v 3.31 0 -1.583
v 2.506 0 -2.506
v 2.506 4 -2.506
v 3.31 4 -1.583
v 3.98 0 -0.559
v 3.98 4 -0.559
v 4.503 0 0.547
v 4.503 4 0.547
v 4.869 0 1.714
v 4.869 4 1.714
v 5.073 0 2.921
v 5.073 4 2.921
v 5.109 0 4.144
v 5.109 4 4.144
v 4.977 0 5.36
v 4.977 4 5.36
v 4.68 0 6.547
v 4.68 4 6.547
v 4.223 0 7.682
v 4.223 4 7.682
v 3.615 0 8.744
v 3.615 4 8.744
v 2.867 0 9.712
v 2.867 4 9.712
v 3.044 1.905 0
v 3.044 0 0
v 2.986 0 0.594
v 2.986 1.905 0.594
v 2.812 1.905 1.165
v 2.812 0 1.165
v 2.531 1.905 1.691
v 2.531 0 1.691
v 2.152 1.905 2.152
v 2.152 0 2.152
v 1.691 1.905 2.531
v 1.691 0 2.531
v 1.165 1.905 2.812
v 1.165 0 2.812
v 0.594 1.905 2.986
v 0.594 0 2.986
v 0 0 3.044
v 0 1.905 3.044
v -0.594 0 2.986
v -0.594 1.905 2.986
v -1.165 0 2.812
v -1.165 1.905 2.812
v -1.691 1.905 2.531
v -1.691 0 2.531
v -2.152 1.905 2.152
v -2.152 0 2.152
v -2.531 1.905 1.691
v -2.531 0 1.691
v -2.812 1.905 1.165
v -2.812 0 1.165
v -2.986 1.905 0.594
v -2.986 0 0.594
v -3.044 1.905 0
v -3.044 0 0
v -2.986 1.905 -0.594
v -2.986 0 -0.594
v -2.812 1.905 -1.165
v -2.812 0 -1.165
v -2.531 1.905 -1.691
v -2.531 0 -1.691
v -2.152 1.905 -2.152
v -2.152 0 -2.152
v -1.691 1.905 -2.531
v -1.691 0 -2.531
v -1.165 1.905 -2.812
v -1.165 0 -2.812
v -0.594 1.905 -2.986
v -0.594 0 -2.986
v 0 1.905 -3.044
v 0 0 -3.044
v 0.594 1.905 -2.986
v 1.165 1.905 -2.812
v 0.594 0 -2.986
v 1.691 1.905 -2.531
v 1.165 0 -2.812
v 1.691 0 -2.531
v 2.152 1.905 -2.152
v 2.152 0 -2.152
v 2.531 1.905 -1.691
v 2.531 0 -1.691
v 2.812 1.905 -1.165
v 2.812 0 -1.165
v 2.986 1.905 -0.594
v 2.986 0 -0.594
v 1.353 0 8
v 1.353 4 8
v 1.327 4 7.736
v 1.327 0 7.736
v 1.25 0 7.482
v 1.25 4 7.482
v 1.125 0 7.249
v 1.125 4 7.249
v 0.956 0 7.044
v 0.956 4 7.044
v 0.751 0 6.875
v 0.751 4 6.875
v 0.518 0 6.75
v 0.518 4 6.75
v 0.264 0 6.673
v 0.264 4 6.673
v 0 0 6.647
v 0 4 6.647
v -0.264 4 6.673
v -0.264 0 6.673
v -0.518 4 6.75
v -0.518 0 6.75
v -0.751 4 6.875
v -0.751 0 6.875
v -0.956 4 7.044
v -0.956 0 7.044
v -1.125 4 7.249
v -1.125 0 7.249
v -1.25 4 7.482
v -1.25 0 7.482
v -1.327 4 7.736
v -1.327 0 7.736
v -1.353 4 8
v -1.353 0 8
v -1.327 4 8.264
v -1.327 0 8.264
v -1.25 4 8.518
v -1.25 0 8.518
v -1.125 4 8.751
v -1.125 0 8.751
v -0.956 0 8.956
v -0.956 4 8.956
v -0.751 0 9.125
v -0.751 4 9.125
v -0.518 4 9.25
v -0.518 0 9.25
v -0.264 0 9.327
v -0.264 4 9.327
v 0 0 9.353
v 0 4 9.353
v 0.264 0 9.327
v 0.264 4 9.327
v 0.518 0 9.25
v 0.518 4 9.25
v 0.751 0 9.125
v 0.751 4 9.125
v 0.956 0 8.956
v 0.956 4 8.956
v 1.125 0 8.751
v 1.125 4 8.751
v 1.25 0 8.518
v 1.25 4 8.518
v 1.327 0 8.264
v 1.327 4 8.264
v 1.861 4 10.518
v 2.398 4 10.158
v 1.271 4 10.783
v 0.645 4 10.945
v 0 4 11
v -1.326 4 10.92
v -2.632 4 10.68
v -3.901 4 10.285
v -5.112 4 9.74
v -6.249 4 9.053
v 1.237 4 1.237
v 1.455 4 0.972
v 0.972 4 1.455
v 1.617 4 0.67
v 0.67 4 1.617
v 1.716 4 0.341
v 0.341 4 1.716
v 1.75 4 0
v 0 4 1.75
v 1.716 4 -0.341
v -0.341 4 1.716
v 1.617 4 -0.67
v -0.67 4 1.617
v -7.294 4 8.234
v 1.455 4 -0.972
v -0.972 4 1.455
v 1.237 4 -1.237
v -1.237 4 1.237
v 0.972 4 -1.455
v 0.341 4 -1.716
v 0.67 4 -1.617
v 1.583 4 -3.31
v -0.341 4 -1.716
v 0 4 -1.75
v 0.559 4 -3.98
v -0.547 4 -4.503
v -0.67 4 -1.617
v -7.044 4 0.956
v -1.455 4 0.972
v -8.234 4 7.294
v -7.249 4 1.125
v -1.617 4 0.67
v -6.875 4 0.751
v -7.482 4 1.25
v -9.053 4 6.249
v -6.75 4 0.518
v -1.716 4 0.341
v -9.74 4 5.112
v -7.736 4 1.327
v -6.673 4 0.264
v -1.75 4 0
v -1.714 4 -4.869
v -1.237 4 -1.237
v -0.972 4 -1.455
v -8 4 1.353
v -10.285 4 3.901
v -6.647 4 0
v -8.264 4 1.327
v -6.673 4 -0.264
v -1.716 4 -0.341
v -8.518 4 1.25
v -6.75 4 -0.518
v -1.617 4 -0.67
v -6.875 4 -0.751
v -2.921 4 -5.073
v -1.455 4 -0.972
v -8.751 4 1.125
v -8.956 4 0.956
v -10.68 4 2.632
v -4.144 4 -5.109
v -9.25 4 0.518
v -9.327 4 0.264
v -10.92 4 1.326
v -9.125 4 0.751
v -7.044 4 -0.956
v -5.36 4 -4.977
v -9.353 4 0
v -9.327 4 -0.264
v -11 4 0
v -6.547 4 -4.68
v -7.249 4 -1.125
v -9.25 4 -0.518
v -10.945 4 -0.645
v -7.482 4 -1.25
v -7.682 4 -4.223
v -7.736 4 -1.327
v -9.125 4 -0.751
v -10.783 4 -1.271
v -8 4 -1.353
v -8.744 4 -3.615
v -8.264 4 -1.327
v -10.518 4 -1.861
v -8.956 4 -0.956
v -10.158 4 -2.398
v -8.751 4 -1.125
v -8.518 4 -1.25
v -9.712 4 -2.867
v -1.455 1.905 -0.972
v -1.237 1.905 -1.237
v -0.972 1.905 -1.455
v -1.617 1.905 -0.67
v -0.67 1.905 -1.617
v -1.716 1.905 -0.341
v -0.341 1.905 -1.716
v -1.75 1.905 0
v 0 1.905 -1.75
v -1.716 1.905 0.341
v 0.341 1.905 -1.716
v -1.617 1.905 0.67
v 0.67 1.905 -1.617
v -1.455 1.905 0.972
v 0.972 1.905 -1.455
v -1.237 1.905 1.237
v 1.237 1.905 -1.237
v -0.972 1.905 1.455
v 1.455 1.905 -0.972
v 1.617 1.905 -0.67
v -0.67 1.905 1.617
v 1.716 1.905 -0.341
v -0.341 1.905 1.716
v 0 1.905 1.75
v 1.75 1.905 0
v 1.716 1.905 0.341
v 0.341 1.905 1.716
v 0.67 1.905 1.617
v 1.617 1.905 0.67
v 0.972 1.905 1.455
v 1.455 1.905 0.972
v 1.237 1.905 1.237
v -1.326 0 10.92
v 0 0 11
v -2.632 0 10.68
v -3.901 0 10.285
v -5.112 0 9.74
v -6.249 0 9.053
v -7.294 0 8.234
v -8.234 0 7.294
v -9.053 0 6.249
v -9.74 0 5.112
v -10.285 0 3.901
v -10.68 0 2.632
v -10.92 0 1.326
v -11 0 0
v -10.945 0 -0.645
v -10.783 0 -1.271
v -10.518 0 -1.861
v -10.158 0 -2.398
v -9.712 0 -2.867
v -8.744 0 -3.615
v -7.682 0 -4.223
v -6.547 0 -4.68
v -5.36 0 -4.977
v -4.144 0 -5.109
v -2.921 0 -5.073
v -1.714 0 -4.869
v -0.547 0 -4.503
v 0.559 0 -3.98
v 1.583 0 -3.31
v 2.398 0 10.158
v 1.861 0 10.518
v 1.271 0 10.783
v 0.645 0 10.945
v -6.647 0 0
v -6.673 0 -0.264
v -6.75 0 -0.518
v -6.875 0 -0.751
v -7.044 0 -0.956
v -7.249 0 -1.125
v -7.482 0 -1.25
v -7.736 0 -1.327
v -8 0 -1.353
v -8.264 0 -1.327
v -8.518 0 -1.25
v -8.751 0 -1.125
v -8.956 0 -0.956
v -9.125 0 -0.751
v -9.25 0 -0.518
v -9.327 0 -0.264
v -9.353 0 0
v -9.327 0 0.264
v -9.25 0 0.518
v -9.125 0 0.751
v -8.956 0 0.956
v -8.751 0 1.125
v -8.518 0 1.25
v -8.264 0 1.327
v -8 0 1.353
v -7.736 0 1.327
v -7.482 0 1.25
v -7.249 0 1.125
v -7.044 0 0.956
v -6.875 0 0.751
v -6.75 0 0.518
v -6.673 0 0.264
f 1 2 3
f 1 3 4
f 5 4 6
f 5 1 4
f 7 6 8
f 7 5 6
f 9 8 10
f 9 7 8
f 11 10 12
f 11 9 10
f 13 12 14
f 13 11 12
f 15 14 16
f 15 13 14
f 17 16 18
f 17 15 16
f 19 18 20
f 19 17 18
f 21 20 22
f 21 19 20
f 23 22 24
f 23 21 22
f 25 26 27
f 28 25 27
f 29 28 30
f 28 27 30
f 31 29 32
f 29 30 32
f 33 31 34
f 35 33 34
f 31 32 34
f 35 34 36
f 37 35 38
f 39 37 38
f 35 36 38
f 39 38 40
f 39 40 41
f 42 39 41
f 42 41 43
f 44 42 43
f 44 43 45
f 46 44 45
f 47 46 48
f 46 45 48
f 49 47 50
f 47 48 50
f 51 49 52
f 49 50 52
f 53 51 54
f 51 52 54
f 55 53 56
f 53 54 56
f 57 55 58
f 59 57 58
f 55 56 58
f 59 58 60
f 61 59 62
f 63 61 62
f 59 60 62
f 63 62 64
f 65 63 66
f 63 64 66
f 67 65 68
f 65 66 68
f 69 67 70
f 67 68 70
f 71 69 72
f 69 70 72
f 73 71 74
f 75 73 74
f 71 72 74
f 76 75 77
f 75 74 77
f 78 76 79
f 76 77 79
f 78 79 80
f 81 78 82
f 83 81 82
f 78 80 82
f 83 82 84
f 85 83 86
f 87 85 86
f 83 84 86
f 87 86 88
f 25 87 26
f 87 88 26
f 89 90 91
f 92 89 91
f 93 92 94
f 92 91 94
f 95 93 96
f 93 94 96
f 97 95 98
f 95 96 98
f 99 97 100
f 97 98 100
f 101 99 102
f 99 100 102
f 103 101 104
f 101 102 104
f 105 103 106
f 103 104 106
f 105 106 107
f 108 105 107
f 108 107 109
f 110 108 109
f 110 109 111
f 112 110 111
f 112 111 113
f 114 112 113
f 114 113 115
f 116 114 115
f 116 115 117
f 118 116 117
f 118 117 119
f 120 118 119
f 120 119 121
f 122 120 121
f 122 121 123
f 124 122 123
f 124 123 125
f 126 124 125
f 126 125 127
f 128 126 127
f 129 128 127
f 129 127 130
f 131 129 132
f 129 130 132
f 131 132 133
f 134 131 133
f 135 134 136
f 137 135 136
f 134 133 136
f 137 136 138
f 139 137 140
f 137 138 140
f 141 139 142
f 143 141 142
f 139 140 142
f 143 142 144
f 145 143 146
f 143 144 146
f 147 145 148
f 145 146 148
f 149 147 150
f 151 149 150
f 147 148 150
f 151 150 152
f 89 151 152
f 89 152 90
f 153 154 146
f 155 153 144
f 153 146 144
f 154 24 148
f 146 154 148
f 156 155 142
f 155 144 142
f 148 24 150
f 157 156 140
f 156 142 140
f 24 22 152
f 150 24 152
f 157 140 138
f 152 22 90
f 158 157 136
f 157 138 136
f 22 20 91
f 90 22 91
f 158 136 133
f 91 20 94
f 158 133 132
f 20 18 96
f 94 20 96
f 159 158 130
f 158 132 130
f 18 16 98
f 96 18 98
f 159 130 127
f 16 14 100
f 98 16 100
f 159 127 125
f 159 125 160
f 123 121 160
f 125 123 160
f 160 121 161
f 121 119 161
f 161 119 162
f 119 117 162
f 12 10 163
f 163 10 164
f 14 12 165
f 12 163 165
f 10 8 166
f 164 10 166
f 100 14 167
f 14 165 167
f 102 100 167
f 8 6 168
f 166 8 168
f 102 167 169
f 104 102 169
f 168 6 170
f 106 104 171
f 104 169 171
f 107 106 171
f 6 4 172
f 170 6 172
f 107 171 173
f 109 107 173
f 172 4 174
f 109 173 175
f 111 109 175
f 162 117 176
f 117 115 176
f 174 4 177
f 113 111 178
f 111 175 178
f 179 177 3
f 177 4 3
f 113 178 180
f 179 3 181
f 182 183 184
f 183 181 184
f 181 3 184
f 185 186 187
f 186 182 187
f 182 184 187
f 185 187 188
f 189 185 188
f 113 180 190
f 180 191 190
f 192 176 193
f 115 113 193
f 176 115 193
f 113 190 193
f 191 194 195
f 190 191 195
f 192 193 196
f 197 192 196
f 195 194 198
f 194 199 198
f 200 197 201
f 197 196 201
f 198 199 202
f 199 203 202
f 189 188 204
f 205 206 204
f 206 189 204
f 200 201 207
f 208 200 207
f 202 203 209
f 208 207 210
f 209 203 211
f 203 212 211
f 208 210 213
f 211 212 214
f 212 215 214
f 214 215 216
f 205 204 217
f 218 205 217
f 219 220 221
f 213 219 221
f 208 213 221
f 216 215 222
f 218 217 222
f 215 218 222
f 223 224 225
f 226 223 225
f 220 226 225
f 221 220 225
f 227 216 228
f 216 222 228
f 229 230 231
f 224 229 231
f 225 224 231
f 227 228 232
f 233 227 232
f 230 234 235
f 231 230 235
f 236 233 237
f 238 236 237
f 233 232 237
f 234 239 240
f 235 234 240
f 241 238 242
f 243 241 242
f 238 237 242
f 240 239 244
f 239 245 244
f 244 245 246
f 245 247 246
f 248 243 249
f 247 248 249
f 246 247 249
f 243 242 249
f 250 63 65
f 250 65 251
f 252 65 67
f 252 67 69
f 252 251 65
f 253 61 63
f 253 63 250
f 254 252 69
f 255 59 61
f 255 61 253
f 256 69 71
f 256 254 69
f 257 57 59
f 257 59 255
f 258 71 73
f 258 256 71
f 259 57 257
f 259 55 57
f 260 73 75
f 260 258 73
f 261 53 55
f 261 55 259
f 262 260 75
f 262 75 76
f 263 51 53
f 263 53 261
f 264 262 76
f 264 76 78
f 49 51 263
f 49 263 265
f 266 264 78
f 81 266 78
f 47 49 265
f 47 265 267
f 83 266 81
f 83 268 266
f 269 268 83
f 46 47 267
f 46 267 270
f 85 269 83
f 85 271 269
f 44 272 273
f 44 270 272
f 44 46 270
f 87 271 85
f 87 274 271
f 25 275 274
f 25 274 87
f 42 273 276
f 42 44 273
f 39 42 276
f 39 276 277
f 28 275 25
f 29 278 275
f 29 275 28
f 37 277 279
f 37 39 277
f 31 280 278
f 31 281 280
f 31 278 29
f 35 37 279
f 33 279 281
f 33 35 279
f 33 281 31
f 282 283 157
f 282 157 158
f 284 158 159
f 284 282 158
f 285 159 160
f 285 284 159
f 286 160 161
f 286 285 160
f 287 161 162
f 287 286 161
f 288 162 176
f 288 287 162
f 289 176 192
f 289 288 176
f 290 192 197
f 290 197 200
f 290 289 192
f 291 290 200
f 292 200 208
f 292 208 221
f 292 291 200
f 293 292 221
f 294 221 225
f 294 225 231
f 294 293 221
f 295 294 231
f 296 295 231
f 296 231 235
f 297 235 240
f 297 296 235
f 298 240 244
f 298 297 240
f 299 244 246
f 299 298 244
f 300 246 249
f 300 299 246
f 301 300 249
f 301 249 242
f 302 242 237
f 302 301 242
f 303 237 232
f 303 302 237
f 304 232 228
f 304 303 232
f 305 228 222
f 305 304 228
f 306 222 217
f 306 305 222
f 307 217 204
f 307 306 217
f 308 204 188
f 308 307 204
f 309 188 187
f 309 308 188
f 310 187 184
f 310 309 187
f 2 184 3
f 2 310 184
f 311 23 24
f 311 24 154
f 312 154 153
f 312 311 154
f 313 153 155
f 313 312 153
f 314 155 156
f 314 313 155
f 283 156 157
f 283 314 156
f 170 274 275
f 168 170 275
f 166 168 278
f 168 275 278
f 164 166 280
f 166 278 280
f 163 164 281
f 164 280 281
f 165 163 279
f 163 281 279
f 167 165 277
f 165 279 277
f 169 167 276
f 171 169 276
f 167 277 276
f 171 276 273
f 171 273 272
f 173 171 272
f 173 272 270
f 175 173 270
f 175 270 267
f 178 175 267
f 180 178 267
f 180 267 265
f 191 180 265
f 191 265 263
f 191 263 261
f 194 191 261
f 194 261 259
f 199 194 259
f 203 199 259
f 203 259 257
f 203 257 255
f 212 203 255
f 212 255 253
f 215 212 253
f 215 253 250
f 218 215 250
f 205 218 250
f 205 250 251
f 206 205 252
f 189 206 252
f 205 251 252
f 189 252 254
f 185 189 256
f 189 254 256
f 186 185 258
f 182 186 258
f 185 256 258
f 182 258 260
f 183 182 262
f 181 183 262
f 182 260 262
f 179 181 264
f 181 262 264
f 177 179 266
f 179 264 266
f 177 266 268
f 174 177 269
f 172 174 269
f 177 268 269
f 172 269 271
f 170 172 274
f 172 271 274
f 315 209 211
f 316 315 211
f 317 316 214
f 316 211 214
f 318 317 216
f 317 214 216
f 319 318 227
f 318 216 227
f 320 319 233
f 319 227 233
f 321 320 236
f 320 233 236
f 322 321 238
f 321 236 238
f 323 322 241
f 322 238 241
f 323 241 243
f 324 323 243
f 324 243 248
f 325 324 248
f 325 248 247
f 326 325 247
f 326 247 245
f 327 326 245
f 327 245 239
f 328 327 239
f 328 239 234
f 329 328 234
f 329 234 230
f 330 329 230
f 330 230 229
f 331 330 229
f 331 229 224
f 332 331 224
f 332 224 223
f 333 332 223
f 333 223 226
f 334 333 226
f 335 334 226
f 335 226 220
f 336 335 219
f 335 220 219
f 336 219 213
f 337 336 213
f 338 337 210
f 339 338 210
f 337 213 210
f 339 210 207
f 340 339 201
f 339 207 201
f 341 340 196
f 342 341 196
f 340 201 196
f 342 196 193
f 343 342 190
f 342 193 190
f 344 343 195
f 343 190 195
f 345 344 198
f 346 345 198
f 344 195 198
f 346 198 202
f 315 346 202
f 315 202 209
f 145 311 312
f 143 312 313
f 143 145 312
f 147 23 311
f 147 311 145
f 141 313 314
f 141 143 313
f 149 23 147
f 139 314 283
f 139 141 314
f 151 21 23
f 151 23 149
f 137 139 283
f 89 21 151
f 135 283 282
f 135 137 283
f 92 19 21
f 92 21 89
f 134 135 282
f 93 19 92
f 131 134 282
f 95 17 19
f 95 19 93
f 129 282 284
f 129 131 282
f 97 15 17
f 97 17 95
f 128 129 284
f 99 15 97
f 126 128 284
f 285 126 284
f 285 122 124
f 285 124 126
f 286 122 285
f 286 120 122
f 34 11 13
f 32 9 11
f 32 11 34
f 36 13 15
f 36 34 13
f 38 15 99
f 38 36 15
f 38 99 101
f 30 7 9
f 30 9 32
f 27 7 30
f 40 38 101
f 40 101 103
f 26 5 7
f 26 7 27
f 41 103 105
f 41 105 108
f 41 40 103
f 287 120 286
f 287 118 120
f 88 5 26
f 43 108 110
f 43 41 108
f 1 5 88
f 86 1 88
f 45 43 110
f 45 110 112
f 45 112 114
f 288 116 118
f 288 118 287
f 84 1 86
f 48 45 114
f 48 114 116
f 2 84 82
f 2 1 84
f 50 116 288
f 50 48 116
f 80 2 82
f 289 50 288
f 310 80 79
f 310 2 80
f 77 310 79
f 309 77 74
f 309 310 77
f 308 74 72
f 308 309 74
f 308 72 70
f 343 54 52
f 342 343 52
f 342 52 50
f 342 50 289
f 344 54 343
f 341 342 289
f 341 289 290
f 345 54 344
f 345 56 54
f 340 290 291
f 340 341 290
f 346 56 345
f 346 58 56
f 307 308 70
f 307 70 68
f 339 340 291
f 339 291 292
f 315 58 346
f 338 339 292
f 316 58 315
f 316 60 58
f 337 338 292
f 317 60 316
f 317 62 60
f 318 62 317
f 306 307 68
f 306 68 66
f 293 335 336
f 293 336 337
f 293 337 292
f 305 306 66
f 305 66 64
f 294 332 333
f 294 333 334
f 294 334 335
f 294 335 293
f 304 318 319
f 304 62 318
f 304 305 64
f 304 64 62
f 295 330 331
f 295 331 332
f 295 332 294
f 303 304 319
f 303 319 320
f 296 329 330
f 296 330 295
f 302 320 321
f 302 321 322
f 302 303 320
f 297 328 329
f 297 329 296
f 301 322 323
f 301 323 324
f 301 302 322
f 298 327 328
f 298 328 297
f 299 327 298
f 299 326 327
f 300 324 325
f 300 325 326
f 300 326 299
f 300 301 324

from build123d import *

# Parameters (mm, degrees)
BOSS_EXTRUDE1_DEPTH   = 4
F_6_32_TAPPED_HOLE1_D = 2.7051
SKETCH4_R             = 3.044
CUT_EXTRUDE1_DEPTH    = 1.905
SKETCH5_R             = 1.75
CUT_EXTRUDE2_DEPTH    = 3.095


with BuildPart() as part:
    # Sketch1 → Boss-Extrude1 (new body)
    with BuildSketch(Plane(origin=(0, 0, 0), x_dir=(1, 0, 0), z_dir=(0, 1, 0))):
        with BuildLine():
            ThreePointArc((2.505986433, 2.505986433), (5.111833916, -3.531413722), (2.866848356, -9.712083716))
            ThreePointArc((2.866848356, -9.712083716), (1.571428319, -10.663233366), (0, -11))
            ThreePointArc((0, -11), (-7.778174593, -7.778174593), (-11, 0))
            ThreePointArc((-11, 0), (-10.663233366, 1.571428319), (-9.712083716, 2.866848356))
            ThreePointArc((-9.712083716, 2.866848356), (-3.531413722, 5.111833916), (2.505986433, 2.505986433))
        make_face()
    extrude(amount=BOSS_EXTRUDE1_DEPTH)

    # #6-32 Tapped Hole1 (through all)
    with Locations(Plane(origin=(0, 0, 0), x_dir=(-1, 0, 0), z_dir=(0, -1, 0))):
        with Locations((8, 0), (0, -8)):
            Hole(F_6_32_TAPPED_HOLE1_D / 2)

    # Sketch4 → Cut-Extrude1 (cut)
    with BuildSketch(Plane.XZ):
        Circle(SKETCH4_R)
    extrude(amount=-CUT_EXTRUDE1_DEPTH, mode=Mode.SUBTRACT)

    # Sketch5 → Cut-Extrude2 (cut, through all)
    with BuildSketch(Plane.XZ.offset(-1.905)):
        Circle(SKETCH5_R)
    extrude(amount=-CUT_EXTRUDE2_DEPTH, mode=Mode.SUBTRACT)


solid = part.part
